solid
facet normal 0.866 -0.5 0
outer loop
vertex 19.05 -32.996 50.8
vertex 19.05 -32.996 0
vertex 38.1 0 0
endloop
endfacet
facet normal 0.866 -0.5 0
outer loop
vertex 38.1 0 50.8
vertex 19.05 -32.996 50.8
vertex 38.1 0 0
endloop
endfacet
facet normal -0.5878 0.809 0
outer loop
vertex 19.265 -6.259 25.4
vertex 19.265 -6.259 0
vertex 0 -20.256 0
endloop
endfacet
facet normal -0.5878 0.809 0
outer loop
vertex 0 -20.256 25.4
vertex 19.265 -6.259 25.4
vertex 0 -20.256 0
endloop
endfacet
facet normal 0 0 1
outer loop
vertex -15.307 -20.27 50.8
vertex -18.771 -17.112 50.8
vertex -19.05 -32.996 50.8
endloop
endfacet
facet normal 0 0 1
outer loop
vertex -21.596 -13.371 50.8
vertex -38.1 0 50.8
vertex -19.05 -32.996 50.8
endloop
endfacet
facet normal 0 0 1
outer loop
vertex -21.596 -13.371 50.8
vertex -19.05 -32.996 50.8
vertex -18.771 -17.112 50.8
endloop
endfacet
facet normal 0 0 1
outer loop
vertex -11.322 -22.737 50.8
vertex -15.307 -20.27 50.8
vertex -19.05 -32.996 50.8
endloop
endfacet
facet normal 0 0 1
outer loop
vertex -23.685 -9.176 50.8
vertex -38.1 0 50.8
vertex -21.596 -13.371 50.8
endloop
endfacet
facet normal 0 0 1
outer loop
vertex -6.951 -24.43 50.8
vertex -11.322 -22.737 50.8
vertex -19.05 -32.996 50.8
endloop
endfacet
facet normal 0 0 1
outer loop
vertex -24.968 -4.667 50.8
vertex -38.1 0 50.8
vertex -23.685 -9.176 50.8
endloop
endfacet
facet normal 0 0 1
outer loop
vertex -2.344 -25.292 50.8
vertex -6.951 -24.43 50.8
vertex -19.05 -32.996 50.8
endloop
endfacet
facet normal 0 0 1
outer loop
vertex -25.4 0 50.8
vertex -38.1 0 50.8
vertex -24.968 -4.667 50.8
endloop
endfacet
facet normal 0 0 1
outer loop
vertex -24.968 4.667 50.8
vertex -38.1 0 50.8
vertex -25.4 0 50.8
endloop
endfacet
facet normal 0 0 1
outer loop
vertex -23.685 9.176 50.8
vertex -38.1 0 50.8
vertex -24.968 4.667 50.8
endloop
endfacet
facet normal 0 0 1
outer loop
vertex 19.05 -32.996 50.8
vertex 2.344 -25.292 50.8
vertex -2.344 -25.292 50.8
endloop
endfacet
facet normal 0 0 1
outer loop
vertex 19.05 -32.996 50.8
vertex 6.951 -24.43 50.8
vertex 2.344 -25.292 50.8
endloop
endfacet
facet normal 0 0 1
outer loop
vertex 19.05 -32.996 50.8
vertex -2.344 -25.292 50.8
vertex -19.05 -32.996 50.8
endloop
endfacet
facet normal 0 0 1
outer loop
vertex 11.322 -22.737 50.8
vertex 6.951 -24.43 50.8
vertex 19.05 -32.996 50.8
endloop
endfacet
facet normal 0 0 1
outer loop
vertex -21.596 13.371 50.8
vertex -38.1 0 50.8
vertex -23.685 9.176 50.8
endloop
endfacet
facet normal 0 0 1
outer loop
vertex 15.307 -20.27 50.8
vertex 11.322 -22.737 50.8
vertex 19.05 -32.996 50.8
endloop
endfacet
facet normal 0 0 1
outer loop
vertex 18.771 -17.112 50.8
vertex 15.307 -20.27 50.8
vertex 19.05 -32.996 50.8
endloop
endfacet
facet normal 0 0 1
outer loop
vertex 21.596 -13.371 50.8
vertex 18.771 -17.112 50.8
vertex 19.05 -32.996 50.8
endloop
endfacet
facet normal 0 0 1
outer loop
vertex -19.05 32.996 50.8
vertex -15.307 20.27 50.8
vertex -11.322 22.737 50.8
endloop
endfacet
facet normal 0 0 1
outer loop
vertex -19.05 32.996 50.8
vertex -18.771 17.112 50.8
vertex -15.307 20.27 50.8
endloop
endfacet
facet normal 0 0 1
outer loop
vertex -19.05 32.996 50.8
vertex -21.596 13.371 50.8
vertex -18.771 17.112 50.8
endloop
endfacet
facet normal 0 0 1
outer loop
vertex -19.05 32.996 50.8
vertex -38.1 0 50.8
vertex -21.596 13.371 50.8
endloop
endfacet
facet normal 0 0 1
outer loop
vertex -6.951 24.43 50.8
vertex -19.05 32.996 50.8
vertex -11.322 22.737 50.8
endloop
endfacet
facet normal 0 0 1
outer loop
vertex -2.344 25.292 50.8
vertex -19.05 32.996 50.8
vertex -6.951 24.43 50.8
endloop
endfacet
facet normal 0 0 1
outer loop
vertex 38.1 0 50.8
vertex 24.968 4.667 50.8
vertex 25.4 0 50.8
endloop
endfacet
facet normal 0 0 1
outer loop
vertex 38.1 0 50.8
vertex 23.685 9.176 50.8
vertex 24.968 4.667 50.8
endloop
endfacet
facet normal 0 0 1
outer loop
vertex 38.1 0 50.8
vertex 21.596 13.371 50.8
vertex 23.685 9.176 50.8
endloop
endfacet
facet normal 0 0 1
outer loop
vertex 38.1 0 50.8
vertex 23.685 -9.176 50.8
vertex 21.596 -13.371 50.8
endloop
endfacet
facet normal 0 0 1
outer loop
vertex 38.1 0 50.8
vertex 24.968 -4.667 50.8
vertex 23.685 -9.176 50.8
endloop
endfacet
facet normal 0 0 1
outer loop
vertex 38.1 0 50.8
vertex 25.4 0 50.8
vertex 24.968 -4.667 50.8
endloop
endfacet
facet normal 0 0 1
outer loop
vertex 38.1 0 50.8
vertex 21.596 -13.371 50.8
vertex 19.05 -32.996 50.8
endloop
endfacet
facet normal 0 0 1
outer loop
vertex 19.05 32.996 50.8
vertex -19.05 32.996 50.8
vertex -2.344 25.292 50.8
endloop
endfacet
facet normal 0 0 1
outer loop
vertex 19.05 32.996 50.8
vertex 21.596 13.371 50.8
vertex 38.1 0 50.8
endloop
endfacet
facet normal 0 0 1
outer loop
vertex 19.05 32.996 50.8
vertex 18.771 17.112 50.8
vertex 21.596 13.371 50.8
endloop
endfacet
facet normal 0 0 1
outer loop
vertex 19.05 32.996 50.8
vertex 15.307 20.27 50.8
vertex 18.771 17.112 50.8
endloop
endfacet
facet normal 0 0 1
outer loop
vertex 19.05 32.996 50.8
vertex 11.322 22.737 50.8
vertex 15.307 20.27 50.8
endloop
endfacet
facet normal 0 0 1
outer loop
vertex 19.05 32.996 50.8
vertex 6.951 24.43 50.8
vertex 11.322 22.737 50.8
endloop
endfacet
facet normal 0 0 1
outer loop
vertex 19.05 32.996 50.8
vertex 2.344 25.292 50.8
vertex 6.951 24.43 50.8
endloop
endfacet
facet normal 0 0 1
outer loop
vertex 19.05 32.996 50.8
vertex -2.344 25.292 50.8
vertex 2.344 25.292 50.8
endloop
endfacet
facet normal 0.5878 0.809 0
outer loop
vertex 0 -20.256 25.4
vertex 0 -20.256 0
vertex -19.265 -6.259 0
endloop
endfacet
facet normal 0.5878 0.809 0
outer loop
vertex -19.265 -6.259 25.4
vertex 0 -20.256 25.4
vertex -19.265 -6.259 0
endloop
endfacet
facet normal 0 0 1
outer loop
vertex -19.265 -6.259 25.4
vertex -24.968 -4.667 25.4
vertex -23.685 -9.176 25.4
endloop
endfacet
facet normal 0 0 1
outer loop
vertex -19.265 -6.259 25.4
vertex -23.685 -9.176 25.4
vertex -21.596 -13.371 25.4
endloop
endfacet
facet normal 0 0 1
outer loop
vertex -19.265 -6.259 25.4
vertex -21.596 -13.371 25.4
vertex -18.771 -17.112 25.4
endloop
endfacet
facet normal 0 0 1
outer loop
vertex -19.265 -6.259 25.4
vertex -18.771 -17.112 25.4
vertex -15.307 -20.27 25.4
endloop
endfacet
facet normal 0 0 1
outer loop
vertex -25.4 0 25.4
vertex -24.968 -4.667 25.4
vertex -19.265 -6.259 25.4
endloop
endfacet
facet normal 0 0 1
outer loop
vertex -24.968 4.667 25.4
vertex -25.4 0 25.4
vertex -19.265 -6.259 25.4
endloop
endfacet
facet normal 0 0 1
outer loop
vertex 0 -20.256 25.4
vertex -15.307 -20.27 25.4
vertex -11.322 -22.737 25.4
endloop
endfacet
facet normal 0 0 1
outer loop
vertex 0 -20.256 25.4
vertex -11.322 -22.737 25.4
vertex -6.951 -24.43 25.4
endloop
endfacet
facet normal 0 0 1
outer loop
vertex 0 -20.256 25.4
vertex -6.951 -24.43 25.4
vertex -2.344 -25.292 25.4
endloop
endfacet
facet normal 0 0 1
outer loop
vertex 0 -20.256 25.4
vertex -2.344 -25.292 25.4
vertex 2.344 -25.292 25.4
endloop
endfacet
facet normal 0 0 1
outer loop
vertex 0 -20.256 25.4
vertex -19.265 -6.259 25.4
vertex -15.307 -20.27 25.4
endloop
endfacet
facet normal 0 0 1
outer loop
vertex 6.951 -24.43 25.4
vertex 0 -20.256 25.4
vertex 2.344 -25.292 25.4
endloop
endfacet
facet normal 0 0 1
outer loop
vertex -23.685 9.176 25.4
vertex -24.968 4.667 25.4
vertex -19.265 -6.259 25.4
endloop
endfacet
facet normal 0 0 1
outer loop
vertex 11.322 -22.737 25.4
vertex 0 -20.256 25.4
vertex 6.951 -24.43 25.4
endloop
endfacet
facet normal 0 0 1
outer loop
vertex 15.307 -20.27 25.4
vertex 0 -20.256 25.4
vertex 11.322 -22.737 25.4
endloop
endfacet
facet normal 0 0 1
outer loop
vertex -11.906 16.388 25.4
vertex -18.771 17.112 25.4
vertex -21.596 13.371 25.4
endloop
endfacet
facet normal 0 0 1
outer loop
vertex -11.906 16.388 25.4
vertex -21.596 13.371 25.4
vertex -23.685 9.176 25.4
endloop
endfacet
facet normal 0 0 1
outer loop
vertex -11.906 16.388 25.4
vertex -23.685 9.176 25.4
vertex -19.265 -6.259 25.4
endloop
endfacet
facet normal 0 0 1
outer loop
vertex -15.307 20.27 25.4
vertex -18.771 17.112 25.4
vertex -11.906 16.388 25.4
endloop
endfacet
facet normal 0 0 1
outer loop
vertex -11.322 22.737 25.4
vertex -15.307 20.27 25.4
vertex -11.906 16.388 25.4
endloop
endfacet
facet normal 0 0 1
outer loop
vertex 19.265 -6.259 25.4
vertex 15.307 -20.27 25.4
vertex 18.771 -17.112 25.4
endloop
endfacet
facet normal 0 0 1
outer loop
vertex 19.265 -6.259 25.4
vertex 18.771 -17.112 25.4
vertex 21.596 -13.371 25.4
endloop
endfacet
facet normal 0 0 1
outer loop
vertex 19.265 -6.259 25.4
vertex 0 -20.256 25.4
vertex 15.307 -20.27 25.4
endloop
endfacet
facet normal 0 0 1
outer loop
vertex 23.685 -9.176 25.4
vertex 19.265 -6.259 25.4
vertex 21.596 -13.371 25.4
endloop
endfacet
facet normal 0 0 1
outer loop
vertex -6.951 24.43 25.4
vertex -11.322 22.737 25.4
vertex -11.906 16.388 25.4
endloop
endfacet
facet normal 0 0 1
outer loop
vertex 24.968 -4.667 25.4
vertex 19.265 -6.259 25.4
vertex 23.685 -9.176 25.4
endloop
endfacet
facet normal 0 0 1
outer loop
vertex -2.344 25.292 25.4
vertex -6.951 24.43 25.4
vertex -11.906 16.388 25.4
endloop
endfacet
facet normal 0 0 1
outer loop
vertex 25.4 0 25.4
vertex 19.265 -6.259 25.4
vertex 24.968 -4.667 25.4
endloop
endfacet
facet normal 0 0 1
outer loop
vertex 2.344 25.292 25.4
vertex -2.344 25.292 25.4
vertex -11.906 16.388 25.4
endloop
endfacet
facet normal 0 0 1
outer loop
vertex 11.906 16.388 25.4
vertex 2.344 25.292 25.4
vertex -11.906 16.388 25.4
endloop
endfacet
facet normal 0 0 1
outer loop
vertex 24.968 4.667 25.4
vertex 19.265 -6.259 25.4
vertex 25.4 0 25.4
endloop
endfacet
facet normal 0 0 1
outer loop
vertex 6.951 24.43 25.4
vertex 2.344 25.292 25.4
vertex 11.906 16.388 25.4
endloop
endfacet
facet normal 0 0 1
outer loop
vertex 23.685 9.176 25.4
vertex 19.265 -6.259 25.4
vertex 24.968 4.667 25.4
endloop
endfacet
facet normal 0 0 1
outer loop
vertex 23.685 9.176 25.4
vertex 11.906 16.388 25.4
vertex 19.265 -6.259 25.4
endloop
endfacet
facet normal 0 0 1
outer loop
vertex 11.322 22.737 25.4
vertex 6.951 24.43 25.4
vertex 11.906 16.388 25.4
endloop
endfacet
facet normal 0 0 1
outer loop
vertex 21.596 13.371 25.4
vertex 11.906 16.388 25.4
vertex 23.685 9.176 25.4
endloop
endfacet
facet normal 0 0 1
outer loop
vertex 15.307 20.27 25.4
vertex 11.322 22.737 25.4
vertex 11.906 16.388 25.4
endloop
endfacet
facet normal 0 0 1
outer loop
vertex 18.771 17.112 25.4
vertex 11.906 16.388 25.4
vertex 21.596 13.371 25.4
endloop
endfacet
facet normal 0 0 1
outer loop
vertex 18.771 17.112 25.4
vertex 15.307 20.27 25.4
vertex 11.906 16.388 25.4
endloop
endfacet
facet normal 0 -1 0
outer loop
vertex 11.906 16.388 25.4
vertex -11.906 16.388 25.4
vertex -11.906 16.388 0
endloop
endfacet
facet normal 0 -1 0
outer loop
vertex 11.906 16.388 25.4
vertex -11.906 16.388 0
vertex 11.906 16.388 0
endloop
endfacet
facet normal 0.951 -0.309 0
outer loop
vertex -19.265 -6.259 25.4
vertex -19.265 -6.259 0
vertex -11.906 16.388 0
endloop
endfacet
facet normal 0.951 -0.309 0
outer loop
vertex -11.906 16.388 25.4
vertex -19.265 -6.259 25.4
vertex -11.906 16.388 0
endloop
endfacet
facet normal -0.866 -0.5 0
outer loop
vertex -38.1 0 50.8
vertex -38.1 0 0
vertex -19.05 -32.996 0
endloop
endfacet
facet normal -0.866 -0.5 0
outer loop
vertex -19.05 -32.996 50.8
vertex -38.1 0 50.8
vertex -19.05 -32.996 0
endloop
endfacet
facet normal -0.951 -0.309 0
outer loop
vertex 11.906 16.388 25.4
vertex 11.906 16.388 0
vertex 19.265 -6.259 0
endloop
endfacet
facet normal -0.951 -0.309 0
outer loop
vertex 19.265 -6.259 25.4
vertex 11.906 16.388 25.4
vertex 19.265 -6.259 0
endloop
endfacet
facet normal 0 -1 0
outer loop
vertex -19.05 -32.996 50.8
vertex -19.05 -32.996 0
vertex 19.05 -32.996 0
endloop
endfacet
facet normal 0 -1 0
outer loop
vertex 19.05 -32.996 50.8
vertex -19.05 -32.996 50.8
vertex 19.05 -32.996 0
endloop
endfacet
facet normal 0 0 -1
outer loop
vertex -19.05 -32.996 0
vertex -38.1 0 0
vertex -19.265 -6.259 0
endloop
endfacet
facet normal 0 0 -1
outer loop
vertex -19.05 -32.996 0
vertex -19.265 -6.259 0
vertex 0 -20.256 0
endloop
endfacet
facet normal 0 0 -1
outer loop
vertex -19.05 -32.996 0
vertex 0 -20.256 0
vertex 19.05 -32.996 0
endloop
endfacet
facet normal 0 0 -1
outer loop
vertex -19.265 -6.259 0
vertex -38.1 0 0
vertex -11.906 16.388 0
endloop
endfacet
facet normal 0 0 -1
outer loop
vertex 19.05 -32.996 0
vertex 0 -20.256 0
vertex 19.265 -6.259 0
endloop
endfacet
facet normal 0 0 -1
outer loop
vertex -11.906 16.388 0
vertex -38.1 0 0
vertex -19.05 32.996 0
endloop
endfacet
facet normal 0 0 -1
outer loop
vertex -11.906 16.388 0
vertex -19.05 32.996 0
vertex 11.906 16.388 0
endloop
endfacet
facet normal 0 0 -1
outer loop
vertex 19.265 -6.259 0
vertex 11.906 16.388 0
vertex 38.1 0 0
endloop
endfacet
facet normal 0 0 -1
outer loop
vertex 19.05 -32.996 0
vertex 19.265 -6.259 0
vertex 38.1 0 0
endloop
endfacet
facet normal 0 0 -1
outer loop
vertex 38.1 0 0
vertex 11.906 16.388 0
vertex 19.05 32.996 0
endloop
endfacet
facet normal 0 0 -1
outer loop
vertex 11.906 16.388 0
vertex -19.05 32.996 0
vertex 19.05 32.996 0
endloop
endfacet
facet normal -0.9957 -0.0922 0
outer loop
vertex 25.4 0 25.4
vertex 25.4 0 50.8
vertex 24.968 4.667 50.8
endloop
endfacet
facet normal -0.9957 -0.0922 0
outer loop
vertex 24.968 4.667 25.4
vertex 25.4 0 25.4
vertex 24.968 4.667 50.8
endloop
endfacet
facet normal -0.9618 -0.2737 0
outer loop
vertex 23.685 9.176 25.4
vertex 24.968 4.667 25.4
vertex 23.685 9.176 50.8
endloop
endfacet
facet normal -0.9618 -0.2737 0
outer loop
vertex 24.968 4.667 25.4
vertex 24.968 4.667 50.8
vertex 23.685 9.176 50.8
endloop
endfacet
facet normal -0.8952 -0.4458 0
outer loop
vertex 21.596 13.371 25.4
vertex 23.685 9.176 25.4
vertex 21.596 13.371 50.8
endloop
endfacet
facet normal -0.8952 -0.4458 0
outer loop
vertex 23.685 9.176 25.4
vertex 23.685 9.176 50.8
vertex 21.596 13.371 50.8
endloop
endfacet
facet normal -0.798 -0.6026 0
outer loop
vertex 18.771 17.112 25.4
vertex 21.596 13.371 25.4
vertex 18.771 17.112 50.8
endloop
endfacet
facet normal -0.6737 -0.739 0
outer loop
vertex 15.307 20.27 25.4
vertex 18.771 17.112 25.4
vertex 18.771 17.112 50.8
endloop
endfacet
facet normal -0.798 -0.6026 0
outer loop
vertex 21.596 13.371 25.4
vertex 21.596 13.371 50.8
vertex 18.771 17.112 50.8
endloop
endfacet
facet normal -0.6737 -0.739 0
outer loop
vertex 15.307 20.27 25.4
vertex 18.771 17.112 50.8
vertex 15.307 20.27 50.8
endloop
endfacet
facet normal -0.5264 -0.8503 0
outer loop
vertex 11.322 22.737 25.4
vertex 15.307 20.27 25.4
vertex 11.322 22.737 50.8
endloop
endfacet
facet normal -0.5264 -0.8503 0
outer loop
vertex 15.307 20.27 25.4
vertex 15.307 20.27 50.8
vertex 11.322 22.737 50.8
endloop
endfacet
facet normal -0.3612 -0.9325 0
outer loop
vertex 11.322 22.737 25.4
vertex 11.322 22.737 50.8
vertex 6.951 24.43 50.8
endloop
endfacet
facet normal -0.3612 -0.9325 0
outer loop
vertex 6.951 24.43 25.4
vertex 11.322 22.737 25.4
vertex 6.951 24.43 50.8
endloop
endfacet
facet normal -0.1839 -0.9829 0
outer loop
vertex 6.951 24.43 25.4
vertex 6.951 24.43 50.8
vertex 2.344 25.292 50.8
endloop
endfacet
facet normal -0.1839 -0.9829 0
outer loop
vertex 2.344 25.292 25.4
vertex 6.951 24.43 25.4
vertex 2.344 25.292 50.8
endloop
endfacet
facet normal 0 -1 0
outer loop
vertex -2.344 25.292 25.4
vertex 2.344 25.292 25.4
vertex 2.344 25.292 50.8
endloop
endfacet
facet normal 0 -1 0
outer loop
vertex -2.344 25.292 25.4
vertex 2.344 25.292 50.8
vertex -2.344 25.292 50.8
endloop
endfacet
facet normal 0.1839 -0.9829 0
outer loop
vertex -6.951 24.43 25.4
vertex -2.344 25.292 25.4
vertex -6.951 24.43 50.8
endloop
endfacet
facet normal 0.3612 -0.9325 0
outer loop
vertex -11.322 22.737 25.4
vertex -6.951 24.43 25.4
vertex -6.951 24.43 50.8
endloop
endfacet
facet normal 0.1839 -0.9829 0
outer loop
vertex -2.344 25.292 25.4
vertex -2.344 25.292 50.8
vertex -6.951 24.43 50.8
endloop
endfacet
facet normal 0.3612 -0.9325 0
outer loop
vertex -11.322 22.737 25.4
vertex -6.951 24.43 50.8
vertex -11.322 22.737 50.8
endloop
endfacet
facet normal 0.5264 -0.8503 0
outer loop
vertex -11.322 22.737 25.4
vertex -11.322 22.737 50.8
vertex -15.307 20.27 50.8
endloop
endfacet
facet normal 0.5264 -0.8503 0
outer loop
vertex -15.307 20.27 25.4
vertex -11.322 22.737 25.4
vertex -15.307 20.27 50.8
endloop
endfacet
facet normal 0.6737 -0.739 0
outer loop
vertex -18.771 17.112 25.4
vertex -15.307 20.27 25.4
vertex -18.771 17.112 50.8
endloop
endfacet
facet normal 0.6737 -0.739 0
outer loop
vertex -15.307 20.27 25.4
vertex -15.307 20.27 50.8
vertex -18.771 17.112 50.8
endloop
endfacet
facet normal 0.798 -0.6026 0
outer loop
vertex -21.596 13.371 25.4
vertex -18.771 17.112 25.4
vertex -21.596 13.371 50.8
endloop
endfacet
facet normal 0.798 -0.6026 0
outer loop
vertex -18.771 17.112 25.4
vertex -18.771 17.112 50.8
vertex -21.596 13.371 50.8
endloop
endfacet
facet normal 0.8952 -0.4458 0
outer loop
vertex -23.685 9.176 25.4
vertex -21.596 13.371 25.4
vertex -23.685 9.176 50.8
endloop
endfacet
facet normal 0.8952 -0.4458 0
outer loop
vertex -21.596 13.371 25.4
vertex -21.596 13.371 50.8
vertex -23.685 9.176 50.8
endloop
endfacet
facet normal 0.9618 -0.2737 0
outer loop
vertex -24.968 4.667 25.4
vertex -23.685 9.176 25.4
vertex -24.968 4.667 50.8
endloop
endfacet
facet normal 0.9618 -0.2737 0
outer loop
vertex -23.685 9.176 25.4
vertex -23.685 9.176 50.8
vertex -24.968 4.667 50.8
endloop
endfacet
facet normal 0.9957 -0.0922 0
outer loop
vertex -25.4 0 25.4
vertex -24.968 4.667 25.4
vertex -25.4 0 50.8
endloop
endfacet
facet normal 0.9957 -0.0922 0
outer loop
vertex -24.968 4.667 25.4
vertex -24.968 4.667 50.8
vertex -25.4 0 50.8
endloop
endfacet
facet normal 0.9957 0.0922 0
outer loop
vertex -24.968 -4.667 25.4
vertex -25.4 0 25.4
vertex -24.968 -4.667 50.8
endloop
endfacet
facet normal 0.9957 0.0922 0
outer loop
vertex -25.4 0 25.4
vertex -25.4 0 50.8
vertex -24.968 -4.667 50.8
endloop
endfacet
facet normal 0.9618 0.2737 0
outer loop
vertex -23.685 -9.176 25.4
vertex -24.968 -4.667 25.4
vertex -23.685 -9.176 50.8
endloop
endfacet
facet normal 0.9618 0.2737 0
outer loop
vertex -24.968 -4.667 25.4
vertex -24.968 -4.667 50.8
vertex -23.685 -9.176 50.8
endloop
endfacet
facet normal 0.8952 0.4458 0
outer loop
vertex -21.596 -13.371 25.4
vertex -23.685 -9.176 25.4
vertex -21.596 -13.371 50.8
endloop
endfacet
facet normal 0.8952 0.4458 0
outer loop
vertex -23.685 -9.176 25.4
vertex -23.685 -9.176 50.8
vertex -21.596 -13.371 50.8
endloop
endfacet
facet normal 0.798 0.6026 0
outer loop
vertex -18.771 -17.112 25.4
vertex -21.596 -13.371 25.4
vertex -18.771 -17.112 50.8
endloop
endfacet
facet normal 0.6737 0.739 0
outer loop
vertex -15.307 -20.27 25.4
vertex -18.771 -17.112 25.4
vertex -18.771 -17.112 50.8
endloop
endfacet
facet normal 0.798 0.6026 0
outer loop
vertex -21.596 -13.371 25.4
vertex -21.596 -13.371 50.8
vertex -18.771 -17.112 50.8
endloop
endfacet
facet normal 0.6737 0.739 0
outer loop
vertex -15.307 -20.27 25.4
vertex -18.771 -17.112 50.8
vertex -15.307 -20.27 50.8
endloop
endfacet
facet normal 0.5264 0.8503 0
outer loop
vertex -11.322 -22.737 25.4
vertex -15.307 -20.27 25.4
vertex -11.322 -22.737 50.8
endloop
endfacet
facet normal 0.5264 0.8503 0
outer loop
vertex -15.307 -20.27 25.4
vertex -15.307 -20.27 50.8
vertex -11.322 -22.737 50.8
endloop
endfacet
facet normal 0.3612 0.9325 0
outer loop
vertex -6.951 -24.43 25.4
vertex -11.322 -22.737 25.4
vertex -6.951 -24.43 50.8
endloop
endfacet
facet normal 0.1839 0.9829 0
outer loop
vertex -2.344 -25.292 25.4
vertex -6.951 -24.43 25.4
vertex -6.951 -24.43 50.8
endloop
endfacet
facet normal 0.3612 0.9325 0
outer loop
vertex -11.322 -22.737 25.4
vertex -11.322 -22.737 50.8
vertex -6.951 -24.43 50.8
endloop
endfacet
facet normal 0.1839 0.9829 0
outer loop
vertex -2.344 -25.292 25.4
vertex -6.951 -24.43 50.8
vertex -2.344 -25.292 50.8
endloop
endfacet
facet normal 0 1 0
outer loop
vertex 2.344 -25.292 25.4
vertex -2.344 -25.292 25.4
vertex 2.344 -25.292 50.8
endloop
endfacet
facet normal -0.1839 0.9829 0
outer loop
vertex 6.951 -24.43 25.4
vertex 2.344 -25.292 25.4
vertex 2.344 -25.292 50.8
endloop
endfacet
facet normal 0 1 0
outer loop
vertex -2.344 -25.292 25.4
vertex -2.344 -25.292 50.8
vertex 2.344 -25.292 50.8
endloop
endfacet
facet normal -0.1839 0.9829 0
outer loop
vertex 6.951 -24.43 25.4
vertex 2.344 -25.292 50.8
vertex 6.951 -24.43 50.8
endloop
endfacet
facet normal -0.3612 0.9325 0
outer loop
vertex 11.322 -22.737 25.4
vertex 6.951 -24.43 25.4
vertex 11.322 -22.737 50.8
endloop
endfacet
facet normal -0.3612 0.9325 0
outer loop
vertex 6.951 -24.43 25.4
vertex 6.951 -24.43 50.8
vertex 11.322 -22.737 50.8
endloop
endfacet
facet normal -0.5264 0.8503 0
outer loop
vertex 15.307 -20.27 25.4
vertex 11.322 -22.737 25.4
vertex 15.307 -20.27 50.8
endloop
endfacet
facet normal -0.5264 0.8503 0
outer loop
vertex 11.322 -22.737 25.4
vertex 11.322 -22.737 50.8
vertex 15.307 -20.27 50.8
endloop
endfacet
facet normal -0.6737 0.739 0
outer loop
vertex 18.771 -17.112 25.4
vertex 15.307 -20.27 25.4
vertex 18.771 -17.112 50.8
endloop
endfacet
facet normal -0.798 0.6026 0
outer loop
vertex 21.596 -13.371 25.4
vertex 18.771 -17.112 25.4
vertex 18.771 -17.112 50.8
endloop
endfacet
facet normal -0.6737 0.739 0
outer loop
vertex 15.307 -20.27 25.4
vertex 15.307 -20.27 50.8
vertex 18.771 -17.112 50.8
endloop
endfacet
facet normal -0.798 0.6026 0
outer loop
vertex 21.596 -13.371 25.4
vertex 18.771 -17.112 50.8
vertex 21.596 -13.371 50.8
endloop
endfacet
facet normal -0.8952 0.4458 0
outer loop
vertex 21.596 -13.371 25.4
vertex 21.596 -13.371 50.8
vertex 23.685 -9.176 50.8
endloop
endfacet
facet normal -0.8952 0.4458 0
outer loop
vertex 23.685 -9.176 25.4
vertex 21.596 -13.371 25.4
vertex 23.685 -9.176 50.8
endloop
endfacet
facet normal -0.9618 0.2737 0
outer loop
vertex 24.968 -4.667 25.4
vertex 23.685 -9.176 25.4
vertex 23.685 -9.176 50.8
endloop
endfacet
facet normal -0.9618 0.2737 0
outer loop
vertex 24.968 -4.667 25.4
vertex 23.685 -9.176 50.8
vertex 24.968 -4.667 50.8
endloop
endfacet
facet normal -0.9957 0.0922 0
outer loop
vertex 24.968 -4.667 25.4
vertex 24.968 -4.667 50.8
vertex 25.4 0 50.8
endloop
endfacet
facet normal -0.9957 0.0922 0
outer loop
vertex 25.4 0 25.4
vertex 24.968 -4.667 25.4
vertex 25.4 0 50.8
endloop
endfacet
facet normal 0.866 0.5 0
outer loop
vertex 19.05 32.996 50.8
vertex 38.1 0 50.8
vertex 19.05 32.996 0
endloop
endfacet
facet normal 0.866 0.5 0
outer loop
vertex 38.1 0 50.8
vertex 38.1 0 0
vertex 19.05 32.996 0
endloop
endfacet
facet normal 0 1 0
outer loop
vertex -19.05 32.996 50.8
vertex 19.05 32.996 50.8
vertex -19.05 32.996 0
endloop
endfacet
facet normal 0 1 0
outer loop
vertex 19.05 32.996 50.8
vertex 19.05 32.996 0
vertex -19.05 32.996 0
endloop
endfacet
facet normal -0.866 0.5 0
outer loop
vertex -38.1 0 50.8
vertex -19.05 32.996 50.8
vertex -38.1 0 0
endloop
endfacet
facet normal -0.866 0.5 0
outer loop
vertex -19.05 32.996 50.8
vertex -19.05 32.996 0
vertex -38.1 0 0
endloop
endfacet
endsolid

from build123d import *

# Parameters (mm, degrees)
F1_DEPTH = 25.4
F3_DEPTH = 25.4
F4_R     = 25.4
F5_DEPTH = 25.4


with BuildPart() as f1:
    # F0 (on Top) → F1 (new body)
    with BuildSketch(Plane.XY):
        Polygon((19.05, 32.995568), (-19.05, 32.995568), (-38.1, 0), (-19.05, -32.995568), (19.05, -32.995568), (38.1, 0), align=None)
        Polygon((-19.264717, -6.259486), (-11.90625, 16.387547), (11.90625, 16.387547), (19.264717, -6.259486), (0, -20.256122), align=None, mode=Mode.SUBTRACT)
    extrude(amount=F1_DEPTH)

    # F2 (on face) → F3 (join)
    with BuildSketch(Plane.XY.offset(25.4)):
        Polygon((0, -20.256122), (19.264717, -6.259486), (11.90625, 16.387547), (-11.90625, 16.387547), (-19.264717, -6.259486), align=None)
        Polygon((19.05, -32.995568), (38.1, 0), (19.05, 32.995568), (-19.05, 32.995568), (-38.1, 0), (-19.05, -32.995568), align=None)
        Polygon((11.90625, 16.387547), (19.264717, -6.259486), (0, -20.256122), (-19.264717, -6.259486), (-11.90625, 16.387547), align=None, mode=Mode.SUBTRACT)
    extrude(amount=F3_DEPTH)

    # F4 (on face) → F5 (cut)
    with BuildSketch(Plane.XY.offset(50.8)):
        Circle(F4_R)
    extrude(amount=-F5_DEPTH, mode=Mode.SUBTRACT)


solid = f1.part
